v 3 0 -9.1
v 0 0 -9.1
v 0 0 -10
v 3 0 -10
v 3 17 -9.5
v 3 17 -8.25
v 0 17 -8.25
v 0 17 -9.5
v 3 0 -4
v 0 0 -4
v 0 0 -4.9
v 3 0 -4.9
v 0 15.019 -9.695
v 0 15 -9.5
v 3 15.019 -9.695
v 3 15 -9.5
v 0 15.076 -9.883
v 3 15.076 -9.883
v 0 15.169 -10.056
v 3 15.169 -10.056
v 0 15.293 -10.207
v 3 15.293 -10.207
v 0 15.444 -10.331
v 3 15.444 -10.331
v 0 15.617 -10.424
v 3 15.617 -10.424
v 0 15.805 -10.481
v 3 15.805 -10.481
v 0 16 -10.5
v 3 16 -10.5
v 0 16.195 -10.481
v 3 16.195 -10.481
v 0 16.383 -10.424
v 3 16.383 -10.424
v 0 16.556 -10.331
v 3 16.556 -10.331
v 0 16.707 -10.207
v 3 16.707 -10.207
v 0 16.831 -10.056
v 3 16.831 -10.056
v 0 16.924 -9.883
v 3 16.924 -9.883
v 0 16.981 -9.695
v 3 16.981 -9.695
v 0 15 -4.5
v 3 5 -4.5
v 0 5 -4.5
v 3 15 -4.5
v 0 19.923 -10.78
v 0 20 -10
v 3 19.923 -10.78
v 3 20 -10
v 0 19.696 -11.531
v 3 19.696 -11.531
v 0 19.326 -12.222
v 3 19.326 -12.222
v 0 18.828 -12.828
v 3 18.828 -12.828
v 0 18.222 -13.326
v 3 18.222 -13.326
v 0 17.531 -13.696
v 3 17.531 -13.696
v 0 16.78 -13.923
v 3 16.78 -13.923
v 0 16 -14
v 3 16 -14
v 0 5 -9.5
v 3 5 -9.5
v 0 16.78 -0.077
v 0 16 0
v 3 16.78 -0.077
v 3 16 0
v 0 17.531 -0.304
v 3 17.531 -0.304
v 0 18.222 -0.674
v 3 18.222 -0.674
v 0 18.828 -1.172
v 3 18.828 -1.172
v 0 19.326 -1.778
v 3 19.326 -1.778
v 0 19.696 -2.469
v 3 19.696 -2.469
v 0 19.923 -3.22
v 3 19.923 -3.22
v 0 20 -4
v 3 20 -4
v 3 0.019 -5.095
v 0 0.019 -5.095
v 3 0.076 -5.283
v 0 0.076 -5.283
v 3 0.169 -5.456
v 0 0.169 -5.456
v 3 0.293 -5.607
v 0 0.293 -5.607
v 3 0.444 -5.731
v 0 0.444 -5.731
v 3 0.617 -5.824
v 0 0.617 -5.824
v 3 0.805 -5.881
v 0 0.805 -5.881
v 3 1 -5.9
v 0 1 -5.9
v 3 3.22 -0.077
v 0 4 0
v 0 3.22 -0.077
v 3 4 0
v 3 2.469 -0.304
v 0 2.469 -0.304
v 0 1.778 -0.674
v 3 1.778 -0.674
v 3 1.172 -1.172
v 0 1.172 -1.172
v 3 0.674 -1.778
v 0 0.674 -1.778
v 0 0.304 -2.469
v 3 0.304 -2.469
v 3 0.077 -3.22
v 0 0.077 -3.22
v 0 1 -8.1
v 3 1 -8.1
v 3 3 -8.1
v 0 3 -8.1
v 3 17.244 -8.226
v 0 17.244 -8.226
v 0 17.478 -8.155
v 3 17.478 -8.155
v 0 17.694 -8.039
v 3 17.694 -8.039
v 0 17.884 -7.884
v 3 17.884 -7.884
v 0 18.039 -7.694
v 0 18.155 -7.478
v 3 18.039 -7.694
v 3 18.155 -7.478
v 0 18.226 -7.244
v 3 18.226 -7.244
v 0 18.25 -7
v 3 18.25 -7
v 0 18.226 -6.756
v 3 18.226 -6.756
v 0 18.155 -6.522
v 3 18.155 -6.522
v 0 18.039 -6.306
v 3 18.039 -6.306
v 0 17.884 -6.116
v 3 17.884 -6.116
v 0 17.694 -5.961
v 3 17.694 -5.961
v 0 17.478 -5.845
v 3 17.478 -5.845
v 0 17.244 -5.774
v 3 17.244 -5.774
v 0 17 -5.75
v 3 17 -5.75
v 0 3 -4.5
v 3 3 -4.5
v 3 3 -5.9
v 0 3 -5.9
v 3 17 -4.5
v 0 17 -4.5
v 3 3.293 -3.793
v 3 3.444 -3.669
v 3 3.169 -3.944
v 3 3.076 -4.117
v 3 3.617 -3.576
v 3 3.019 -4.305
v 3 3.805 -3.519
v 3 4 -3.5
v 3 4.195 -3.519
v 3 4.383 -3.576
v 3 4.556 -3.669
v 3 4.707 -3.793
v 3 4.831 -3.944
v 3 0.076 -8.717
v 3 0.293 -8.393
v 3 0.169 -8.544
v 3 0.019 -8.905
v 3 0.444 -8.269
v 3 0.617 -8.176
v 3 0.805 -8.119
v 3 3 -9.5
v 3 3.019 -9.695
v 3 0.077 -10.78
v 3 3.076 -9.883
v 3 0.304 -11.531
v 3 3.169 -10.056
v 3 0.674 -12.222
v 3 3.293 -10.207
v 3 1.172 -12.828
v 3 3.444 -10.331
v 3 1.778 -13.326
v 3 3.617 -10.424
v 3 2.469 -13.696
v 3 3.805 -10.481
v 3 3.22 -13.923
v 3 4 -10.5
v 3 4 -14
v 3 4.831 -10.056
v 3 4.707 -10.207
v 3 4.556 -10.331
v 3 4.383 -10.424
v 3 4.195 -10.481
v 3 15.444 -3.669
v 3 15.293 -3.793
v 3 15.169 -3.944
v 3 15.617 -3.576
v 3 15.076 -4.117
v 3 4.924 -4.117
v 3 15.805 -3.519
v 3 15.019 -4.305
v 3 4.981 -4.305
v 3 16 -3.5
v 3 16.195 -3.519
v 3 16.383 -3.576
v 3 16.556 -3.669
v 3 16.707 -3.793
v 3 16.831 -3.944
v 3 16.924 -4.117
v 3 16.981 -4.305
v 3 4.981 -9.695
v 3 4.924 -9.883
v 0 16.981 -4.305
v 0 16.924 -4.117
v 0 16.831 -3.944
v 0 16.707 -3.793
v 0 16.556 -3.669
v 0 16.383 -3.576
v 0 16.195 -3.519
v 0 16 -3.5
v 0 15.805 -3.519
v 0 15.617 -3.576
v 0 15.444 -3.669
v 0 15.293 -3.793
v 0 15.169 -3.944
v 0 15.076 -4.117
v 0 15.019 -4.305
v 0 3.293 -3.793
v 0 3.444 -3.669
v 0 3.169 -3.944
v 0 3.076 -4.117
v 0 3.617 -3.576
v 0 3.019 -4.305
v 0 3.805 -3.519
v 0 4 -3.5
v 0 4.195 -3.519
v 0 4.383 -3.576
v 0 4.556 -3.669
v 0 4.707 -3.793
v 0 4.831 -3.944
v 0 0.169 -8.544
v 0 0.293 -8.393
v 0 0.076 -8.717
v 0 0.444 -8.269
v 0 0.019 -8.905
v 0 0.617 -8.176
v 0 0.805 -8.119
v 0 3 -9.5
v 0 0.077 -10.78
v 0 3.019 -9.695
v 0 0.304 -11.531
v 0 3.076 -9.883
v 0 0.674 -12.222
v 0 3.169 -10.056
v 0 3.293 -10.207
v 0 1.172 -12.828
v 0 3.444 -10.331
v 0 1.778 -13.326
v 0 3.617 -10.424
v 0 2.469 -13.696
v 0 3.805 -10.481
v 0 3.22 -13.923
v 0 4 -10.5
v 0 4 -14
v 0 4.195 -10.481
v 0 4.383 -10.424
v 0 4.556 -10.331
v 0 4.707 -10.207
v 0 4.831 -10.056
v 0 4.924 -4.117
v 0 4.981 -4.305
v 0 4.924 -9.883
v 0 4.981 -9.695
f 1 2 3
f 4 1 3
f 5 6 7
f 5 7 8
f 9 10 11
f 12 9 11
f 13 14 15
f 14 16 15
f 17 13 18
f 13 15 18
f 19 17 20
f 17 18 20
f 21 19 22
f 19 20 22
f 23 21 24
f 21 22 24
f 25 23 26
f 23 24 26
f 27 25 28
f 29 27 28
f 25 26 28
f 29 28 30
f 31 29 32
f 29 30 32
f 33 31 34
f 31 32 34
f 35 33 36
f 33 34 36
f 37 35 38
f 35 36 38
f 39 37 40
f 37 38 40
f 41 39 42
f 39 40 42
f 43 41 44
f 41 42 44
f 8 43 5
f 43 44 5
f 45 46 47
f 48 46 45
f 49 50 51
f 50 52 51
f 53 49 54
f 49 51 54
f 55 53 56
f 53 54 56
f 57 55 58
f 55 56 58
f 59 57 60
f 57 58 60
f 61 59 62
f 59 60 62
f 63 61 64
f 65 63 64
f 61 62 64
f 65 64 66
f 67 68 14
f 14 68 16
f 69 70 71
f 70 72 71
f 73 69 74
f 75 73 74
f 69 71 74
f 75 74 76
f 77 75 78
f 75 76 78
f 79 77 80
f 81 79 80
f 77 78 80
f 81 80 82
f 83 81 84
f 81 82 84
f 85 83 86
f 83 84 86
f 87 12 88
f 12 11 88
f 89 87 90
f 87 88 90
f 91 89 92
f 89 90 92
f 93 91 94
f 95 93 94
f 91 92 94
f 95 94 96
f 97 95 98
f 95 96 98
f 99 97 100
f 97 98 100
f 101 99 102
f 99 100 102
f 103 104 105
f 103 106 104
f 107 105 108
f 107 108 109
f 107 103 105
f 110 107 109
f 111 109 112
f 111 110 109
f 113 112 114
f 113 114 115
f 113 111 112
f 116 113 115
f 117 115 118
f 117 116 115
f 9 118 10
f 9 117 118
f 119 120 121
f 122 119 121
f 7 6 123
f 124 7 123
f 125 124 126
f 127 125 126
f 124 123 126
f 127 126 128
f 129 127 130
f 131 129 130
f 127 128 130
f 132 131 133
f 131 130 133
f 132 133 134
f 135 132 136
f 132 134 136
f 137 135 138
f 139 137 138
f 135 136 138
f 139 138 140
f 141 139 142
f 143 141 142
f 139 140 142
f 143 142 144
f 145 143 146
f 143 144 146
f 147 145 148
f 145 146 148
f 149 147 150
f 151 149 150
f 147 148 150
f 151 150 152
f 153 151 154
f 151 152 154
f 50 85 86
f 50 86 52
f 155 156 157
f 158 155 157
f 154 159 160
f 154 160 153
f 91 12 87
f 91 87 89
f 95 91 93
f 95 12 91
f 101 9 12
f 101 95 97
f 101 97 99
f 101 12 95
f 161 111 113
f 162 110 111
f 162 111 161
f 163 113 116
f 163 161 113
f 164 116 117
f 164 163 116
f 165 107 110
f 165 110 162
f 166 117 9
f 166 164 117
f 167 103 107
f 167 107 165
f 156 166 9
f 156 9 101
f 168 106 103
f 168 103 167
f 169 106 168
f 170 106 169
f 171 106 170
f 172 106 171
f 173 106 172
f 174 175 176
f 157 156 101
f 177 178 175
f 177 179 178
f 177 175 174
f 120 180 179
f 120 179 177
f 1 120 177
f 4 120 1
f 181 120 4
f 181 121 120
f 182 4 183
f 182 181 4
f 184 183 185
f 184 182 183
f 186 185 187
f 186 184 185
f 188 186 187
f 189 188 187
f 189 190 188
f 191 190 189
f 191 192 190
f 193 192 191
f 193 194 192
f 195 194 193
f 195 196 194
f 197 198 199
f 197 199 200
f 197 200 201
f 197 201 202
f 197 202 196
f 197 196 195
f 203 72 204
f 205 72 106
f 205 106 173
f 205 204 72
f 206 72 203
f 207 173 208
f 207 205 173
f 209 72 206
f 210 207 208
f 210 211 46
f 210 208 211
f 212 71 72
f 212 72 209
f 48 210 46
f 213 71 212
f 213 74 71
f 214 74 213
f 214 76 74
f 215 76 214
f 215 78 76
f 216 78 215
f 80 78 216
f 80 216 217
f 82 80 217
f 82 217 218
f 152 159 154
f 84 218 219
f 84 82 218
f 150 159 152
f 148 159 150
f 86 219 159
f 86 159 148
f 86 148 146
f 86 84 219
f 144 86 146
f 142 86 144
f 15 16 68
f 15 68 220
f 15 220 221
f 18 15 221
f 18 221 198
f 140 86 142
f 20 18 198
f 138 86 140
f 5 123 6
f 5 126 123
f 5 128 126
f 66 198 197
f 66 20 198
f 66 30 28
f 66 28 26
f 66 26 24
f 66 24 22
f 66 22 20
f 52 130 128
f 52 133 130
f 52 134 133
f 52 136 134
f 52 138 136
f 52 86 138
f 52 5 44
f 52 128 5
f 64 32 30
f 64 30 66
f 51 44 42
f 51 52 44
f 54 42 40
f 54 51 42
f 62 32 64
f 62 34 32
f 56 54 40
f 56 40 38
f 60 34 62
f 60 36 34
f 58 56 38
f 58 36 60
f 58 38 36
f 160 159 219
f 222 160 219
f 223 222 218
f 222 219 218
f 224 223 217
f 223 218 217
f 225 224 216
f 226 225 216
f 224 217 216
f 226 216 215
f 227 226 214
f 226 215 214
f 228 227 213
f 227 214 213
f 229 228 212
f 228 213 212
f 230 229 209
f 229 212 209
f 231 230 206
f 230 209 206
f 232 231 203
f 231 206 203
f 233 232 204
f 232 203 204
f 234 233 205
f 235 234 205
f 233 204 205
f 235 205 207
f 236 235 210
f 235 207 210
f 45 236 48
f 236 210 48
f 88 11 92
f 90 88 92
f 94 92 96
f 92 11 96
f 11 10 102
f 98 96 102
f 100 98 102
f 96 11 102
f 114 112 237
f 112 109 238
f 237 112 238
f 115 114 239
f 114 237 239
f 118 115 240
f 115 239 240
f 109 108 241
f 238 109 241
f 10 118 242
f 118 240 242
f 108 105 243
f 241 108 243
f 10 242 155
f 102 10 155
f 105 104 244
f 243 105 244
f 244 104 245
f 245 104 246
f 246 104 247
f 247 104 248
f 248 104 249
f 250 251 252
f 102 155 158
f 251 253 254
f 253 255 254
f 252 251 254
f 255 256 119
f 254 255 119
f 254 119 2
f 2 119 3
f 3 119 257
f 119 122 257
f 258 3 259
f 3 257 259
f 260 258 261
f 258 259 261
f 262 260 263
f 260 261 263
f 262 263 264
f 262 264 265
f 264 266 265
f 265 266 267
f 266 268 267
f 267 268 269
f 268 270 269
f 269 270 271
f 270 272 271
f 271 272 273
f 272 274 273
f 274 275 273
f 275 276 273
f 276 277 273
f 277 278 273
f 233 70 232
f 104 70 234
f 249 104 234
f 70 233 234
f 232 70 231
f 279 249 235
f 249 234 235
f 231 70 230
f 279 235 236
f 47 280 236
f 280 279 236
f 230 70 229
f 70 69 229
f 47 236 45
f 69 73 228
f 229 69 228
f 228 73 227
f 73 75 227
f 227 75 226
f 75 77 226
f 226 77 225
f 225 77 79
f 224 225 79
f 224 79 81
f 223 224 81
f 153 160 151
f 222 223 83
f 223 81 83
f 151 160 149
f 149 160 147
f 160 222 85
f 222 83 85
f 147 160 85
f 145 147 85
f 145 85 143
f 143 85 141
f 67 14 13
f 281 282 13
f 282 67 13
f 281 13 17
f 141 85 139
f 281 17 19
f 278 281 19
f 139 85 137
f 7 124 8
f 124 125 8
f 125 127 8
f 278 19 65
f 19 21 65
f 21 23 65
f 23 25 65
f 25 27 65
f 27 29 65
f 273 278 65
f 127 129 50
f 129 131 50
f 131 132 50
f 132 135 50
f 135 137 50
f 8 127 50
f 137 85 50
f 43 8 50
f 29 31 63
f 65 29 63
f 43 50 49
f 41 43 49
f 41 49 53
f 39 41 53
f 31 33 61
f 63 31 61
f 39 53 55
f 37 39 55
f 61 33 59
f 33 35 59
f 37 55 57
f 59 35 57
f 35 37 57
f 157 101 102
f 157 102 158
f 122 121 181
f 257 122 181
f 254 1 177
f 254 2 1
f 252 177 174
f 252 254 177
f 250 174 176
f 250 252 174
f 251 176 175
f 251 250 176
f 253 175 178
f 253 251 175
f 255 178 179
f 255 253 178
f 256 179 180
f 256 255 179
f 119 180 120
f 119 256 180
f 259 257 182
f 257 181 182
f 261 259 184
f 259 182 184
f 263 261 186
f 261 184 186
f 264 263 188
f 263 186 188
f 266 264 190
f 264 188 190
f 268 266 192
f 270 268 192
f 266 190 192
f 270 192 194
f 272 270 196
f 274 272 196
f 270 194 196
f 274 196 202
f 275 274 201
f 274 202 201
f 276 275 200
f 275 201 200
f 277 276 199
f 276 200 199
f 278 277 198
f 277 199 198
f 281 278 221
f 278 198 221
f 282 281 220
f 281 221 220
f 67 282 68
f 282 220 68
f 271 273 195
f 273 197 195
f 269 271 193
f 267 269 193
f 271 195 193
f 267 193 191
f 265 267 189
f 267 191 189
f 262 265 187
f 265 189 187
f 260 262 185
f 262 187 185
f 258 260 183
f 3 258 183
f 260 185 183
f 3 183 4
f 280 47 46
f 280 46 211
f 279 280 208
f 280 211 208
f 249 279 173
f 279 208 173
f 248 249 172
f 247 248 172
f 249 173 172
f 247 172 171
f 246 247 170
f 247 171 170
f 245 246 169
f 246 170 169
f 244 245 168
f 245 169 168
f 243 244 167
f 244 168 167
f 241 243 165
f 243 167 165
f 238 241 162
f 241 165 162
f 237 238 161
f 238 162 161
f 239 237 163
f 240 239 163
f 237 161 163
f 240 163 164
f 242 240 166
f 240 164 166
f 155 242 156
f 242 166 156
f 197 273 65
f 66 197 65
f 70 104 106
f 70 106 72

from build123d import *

# Parameters (mm, degrees)
SKETCH_1_W          = 14
SKETCH_1_H          = 20
EXTRUDE_1_DEPTH     = 3
SKETCH_2_W          = 5
SKETCH_2_H          = 14
CUT_EXTRUDE_1_DEPTH = 3
SKETCH_3_R          = 1
CUT_EXTRUDE_2_DEPTH = 3
SKETCH_4_W          = 2.2
SKETCH_4_H          = 3
CUT_EXTRUDE_3_DEPTH = 3
FILLET_1_R          = 4
FILLET_2_R          = 1
SKETCH_5_R          = 1.25
CUT_EXTRUDE_4_DEPTH = 10


with BuildPart() as part:
    # 스케치1 → 보스-돌출1 (new body)
    with BuildSketch(Plane(origin=(0, 0, 0), x_dir=(0, 0, -1), z_dir=(1, 0, 0))):
        with Locations((7, 10)):
            Rectangle(SKETCH_1_W, SKETCH_1_H)
    extrude(amount=EXTRUDE_1_DEPTH)

    # 스케치2 → 컷-돌출1 (cut)
    with BuildSketch(Plane(origin=(3, 0, 0), x_dir=(0, 0, -1), z_dir=(1, 0, 0))):
        with Locations((7, 10)):
            Rectangle(SKETCH_2_W, SKETCH_2_H)
    extrude(amount=-CUT_EXTRUDE_1_DEPTH, mode=Mode.SUBTRACT)

    # 스케치3 → 컷-돌출2 (cut)
    with BuildSketch(Plane(origin=(3, 0, 0), x_dir=(0, 0, -1), z_dir=(1, 0, 0))):
        with Locations((9.5, 16)):
            Circle(SKETCH_3_R)
        with Locations((4.5, 16)):
            Circle(SKETCH_3_R)
        with Locations((4.5, 4)):
            Circle(SKETCH_3_R)
        with Locations((9.5, 4)):
            Circle(SKETCH_3_R)
    extrude(amount=-CUT_EXTRUDE_2_DEPTH, mode=Mode.SUBTRACT)

    # 스케치4 → 컷-돌출3 (cut)
    with BuildSketch(Plane(origin=(3, 0, 0), x_dir=(0, 0, -1), z_dir=(1, 0, 0))):
        with Locations((7, 1.5)):
            Rectangle(SKETCH_4_W, SKETCH_4_H)
    extrude(amount=-CUT_EXTRUDE_3_DEPTH, mode=Mode.SUBTRACT)

    # 필렛1
    fillet_1_edges = [part.edges().sort_by_distance(p)[0] for p in [
        (1.5, 20, 0),
        (1.5, 20, -14),
        (1.5, 0, -14),
        (1.5, 0, 0),
    ]]
    fillet(fillet_1_edges, radius=FILLET_1_R)

    # 필렛2
    fillet_2_edges = [part.edges().sort_by_distance(p)[0] for p in [
        (1.5, 0, -8.1),
        (1.5, 0, -5.9),
    ]]
    fillet(fillet_2_edges, radius=FILLET_2_R)

    # 스케치5 → 컷-돌출4 (cut)
    with BuildSketch(Plane(origin=(3, 0, 0), x_dir=(0, 0, -1), z_dir=(1, 0, 0))):
        with Locations((7, 17)):
            Circle(SKETCH_5_R)
    extrude(amount=-CUT_EXTRUDE_4_DEPTH, mode=Mode.SUBTRACT)


solid = part.part
